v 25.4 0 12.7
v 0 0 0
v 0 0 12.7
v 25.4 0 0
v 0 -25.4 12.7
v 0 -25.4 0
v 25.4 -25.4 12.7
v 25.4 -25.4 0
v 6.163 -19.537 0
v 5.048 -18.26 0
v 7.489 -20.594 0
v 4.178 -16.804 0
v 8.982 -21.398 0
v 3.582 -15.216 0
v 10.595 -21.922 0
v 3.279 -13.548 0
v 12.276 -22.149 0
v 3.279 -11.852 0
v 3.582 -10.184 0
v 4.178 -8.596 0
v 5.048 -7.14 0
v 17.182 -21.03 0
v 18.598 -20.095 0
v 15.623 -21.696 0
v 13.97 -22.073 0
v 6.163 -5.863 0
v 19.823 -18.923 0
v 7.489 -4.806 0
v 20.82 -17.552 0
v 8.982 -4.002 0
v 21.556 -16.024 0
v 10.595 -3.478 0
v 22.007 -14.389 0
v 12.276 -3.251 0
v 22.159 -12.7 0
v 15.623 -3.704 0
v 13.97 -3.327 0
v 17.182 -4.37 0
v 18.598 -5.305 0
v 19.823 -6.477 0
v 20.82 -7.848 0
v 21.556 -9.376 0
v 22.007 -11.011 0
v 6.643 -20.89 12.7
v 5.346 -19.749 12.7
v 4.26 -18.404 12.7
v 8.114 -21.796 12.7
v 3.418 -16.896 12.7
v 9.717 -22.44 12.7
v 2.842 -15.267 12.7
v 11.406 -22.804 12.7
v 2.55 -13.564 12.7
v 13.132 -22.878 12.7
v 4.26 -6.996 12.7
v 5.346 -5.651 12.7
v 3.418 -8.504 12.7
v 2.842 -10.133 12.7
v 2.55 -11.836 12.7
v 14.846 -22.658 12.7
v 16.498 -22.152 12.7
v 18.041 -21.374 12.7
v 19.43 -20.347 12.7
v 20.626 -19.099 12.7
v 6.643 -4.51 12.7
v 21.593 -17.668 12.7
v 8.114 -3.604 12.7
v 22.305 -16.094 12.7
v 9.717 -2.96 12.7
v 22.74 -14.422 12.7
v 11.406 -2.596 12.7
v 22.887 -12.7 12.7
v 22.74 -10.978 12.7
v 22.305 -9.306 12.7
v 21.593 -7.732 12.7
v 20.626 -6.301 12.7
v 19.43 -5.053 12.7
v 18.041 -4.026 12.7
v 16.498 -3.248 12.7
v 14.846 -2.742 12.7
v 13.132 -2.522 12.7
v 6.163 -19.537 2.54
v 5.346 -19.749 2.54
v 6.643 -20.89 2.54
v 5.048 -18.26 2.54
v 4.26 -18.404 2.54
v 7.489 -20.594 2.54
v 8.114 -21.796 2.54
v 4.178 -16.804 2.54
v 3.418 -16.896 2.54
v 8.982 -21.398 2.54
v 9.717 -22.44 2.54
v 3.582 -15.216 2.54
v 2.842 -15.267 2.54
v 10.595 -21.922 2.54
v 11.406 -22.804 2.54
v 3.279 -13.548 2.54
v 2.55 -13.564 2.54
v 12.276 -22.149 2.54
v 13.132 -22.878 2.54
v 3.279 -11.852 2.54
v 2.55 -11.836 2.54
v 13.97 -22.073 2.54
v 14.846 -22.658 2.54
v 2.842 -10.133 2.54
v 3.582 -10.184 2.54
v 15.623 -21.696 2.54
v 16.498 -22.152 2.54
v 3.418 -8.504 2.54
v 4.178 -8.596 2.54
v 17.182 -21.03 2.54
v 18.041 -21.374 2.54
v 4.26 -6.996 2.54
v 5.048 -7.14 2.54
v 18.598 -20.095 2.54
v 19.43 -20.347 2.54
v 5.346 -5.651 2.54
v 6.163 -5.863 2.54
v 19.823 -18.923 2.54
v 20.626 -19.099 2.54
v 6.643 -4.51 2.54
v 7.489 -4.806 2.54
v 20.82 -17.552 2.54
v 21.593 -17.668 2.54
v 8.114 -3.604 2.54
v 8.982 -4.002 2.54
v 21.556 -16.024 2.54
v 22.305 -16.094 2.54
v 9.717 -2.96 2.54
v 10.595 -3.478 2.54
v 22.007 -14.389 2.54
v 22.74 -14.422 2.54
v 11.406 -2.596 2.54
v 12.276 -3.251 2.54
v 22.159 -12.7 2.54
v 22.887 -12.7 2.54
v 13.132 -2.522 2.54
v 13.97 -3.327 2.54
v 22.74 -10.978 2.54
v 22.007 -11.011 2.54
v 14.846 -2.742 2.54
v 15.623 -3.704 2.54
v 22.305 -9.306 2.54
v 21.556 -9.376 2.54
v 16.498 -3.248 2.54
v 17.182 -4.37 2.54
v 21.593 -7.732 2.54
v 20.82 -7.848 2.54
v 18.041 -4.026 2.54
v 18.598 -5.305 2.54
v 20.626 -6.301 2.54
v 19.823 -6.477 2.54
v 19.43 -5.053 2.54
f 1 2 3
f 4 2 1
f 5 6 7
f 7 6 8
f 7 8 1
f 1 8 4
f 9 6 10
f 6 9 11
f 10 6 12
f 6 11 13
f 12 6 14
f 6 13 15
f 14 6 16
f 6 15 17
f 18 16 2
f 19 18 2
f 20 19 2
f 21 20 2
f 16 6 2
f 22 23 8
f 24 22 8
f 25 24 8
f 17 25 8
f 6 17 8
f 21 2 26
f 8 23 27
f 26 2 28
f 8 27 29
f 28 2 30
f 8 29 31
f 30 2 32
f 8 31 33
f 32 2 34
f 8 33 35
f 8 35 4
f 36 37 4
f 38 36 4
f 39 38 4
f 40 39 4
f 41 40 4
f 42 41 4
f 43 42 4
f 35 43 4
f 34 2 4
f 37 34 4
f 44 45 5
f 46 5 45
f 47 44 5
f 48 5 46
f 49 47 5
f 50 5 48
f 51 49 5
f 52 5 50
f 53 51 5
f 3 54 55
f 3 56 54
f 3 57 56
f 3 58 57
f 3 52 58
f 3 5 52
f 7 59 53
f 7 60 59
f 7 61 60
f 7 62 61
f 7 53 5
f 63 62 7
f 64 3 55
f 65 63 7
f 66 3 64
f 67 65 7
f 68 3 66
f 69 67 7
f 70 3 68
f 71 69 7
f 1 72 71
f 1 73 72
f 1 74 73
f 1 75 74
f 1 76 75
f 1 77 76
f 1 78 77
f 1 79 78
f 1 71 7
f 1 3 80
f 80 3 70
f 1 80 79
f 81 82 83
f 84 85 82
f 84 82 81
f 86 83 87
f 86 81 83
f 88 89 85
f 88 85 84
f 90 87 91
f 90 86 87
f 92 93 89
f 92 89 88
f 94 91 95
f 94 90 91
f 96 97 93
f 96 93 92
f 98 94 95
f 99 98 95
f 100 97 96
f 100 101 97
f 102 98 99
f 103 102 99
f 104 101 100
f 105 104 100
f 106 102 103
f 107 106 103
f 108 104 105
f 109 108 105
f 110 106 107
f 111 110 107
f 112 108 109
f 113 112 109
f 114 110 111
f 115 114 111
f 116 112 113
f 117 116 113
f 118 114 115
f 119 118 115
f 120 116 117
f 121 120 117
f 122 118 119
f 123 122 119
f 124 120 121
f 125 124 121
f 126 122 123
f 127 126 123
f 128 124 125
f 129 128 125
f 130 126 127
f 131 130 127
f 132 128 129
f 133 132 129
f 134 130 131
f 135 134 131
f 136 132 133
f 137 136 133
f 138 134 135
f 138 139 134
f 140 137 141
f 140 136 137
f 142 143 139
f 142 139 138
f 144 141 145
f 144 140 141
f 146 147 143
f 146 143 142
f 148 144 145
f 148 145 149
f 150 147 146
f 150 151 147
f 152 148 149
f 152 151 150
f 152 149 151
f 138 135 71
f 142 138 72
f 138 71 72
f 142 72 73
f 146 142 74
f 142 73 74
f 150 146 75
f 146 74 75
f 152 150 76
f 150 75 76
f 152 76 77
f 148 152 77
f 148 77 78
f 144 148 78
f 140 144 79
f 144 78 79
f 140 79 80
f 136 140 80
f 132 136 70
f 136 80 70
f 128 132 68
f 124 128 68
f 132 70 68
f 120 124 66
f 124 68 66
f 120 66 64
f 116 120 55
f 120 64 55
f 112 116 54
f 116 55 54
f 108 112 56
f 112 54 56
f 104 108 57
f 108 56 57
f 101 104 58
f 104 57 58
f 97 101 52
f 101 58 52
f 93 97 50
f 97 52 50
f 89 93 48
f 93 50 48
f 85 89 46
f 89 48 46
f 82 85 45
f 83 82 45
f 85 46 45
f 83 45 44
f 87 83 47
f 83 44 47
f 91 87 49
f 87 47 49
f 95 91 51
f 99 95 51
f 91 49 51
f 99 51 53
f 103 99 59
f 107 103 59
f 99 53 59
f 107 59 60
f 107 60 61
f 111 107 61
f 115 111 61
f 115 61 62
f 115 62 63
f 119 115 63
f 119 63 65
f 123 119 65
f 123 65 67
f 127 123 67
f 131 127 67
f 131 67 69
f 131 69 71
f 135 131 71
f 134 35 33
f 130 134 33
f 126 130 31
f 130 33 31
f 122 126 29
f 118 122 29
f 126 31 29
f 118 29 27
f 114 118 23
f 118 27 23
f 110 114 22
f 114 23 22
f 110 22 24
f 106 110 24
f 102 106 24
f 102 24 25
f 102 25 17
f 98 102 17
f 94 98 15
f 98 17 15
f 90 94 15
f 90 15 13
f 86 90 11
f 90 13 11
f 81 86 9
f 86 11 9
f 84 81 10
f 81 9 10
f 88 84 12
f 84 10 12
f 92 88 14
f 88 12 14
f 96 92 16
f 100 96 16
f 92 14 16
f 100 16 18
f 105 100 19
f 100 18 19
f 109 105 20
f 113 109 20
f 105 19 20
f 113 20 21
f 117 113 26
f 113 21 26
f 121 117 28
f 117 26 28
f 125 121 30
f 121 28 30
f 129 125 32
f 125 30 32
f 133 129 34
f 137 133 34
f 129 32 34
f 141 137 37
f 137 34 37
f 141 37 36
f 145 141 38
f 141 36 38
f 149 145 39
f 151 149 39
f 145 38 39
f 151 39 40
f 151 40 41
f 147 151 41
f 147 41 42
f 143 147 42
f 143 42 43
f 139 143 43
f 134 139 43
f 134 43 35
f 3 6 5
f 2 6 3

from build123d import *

# Parameters (mm, degrees)
F0_W     = 25.4
F0_H     = 25.4
F1_DEPTH = 12.7
F2_R     = 10.186713
F3_DEPTH = 10.16
F4_R     = 9.458979
F5_DEPTH = 2.54


with BuildPart() as f1:
    # F0 (on Top) → F1 (new body)
    with BuildSketch(Plane.XY):
        with Locations((12.7, -12.7)):
            Rectangle(F0_W, F0_H)
    extrude(amount=F1_DEPTH)

    # F2 (on face) → F3 (cut)
    with BuildSketch(Plane.XY.offset(12.7)):
        with Locations((12.7, -12.7)):
            Circle(F2_R)
    extrude(amount=-F3_DEPTH, mode=Mode.SUBTRACT)

    # F4 (on face) → F5 (cut)
    with BuildSketch(Plane(origin=(0, 0, 0), x_dir=(1, 0, 0), z_dir=(0, 0, -1))):
        with Locations((12.7, 12.7)):
            Circle(F4_R)
    extrude(amount=-F5_DEPTH, mode=Mode.SUBTRACT)


solid = f1.part
